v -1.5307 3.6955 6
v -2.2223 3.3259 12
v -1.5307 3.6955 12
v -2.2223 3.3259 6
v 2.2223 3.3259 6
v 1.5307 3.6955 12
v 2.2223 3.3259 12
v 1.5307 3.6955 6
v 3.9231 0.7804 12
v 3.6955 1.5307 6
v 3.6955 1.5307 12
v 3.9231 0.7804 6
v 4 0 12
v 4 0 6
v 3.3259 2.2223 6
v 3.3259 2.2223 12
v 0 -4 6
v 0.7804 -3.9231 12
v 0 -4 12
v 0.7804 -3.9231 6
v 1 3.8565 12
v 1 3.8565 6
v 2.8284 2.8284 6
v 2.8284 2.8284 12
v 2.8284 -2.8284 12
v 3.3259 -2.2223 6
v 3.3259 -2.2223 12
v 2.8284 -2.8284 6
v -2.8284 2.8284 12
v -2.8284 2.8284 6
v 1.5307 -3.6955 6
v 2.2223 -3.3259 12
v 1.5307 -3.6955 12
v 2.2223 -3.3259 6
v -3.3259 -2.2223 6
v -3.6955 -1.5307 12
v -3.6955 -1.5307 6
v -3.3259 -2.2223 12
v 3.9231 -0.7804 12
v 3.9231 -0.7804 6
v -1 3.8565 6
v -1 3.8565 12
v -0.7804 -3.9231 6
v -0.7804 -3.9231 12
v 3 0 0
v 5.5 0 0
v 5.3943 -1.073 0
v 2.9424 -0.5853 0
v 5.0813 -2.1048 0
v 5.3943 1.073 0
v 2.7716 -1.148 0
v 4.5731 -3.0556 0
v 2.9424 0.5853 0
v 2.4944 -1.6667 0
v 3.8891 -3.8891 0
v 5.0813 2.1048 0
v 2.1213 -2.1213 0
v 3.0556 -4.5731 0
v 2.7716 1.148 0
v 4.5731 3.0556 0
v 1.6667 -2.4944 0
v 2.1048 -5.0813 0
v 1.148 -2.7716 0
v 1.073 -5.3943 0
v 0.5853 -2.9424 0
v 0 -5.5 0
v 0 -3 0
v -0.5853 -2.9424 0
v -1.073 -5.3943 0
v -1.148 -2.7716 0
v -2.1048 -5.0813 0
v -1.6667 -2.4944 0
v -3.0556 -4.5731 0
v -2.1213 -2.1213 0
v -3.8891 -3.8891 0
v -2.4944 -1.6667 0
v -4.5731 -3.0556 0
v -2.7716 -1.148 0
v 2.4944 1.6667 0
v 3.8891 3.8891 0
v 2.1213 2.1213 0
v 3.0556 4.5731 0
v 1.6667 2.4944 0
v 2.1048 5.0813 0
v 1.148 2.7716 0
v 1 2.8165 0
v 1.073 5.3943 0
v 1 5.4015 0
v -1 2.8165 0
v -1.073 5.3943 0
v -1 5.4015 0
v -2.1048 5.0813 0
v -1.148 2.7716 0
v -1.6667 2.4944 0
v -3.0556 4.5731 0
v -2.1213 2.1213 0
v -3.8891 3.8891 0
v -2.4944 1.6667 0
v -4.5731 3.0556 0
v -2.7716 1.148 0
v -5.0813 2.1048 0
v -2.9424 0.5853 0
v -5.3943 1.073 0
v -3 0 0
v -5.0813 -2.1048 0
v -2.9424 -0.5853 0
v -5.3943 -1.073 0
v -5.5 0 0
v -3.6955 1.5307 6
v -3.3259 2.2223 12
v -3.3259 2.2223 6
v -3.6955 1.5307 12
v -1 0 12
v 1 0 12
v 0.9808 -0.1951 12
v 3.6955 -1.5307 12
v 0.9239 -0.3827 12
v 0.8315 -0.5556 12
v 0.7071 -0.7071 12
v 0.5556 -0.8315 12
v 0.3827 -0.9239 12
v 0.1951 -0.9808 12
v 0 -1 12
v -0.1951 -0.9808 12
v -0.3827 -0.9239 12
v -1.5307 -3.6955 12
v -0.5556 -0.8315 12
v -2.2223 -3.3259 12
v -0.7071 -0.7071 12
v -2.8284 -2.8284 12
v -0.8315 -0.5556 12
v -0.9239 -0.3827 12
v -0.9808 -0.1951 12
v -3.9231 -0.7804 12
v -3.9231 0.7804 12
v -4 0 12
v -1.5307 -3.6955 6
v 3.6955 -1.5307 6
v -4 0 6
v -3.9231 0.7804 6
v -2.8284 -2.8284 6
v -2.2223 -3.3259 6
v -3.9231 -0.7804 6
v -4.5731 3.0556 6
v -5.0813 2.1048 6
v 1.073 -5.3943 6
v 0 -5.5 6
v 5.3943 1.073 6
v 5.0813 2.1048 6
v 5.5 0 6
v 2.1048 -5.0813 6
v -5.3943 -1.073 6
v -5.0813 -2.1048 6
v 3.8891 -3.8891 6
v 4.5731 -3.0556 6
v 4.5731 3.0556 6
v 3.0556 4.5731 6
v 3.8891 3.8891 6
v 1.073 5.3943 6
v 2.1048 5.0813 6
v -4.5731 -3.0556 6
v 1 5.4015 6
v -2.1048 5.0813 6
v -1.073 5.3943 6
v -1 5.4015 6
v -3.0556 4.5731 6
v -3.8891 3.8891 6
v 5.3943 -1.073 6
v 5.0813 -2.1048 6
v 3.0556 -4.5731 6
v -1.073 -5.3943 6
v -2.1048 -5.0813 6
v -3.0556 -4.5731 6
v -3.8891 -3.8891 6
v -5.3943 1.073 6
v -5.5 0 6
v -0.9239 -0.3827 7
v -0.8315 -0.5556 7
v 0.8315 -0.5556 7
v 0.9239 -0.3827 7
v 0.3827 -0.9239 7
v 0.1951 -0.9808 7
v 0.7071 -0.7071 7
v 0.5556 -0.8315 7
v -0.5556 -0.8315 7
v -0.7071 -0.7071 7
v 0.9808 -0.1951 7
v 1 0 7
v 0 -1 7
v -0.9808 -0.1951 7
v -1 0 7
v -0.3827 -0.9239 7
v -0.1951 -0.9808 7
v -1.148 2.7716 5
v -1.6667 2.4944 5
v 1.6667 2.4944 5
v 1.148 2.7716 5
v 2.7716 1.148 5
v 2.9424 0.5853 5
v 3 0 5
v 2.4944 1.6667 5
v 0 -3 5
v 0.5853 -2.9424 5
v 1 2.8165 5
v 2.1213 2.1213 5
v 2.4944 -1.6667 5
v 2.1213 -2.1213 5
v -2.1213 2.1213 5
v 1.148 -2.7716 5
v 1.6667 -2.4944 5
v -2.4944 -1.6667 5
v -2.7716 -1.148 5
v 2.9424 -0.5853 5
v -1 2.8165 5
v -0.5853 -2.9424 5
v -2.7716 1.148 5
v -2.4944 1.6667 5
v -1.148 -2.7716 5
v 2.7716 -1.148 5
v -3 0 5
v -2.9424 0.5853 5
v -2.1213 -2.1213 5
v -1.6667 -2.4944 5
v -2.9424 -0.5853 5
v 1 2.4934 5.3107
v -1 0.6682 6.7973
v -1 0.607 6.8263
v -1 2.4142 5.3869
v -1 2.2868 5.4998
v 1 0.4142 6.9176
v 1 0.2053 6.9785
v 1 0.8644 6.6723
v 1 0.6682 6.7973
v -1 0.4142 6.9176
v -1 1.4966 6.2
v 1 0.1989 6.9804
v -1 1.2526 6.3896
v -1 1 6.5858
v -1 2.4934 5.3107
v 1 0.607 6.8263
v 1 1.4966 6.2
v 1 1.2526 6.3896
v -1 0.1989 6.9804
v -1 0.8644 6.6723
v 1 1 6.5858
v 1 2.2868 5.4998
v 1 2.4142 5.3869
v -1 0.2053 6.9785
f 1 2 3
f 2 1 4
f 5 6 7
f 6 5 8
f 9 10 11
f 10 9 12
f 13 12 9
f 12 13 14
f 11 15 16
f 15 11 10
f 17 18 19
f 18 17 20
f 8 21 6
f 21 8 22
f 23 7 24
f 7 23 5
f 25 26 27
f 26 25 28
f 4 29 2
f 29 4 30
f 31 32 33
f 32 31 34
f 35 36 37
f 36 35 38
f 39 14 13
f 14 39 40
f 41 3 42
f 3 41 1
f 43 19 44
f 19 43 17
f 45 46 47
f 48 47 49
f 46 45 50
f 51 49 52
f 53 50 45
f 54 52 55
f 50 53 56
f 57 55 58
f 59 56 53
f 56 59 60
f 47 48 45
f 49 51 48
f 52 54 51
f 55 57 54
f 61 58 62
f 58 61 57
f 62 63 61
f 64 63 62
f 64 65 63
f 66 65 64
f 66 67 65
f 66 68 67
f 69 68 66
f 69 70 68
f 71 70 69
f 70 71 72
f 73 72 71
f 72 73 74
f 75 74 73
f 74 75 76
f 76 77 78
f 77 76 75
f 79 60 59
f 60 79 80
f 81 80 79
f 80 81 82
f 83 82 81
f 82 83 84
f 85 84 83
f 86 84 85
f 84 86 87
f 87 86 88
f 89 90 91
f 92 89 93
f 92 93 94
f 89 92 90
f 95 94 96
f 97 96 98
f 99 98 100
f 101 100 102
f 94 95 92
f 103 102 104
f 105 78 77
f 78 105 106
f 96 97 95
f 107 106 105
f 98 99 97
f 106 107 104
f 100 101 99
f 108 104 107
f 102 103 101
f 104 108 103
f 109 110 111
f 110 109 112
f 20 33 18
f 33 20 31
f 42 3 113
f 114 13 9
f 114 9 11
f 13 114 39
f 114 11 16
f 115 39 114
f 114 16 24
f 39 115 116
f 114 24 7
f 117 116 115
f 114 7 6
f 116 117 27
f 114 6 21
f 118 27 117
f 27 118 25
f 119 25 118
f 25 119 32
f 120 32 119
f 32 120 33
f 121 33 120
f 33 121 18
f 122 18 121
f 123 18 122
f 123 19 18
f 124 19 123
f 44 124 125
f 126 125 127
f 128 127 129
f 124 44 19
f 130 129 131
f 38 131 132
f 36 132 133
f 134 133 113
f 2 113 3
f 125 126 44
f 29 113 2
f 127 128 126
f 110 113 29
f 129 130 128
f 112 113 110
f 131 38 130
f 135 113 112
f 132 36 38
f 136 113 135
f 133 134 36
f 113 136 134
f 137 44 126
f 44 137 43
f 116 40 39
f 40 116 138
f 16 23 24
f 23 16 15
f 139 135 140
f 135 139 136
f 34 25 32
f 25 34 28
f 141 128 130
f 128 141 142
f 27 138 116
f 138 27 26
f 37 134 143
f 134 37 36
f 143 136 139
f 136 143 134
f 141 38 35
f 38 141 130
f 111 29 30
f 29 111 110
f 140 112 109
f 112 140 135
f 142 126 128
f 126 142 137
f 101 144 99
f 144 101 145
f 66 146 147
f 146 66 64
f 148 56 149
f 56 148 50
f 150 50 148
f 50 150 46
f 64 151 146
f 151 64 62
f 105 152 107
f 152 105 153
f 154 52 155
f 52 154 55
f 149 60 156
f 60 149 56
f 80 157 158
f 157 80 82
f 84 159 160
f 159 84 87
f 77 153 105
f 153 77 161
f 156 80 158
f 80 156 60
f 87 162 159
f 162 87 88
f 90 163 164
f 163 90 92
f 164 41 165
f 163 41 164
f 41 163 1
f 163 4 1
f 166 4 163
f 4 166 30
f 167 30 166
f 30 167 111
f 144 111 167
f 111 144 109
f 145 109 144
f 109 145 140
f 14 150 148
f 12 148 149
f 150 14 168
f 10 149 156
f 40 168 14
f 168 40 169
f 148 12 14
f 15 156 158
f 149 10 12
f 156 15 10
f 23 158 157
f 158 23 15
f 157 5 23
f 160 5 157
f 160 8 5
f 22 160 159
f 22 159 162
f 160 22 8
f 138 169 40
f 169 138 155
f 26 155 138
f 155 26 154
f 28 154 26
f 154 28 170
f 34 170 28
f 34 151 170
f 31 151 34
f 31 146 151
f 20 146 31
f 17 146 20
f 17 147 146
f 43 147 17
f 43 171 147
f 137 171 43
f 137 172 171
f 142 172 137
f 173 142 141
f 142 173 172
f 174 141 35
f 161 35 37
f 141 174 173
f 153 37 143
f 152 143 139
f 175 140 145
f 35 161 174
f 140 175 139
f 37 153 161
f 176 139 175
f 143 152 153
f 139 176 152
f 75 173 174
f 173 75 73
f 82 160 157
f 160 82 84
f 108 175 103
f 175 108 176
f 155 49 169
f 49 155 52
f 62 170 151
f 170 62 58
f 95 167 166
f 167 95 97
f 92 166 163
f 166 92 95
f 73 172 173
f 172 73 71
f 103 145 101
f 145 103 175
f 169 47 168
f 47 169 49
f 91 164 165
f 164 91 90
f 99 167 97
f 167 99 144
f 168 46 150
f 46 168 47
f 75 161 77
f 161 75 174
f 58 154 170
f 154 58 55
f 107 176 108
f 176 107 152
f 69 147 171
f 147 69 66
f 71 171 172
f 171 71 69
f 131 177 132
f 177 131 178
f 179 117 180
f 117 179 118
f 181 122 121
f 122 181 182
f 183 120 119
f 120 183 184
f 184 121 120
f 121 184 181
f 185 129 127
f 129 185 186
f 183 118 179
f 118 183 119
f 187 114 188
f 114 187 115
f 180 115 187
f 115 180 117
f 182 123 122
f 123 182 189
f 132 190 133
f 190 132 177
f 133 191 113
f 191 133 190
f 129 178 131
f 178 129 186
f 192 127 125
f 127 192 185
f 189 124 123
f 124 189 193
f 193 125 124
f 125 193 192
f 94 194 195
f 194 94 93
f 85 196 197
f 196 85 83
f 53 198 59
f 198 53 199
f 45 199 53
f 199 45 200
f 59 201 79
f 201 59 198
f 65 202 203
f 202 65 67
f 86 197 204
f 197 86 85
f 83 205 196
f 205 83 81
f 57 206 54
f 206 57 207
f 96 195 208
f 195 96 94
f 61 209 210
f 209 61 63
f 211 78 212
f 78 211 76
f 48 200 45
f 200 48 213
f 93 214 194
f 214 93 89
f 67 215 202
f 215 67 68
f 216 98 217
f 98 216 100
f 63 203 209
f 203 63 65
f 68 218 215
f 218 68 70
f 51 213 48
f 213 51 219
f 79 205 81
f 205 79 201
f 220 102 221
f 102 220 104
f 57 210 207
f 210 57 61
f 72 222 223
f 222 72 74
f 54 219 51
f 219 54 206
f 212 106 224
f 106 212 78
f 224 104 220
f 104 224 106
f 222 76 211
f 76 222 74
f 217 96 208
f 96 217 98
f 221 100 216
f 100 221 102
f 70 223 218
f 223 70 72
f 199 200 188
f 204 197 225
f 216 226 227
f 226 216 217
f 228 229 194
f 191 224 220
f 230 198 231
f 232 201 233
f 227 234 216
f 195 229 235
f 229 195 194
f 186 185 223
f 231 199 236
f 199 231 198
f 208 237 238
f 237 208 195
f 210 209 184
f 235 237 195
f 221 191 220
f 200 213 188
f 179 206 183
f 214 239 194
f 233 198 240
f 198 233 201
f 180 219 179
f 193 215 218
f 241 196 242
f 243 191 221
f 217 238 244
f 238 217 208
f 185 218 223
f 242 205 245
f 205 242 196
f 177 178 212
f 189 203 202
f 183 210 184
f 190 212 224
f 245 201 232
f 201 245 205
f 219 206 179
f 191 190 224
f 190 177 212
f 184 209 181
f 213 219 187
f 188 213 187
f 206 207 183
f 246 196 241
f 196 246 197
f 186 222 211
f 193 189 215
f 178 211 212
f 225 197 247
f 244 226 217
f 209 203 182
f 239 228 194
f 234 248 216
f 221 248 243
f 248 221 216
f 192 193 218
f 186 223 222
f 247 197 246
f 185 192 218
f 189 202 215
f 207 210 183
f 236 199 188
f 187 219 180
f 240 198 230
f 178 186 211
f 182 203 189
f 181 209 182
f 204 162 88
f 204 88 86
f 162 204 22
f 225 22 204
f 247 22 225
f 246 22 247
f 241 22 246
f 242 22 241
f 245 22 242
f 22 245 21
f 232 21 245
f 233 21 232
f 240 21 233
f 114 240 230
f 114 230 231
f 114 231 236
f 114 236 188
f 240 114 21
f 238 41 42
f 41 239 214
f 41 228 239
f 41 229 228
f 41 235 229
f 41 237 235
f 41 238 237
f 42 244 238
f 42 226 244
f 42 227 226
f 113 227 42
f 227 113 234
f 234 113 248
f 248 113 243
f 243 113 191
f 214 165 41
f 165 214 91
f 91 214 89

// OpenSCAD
hole_diameter = 10.0;
rod_diameter = 5.3;
hole_depth = 7.5;
top_height = 2.0;
top_diameter = 12.6;

difference()
{
    union()
    {
        cylinder(
            h = 6 + 6,
            d = 8,
            $fn = 32);
        
        cylinder(
            h = 6,
            d = 11,
            $fn = 32);
    }
    
    union()
    {
        cylinder(
        h = 12,
        d = 2,
        $fn = 32);
        
        cylinder(
        h = 5,
        d = 6,
        $fn = 32);
        
        translate([0,0,5])
        cylinder(
        h=2,
        d1=6,
        d2=2,
        $fn = 32);
        
        translate([-1,0,0]) cube(size=[2,10, 12]);
    }
}
